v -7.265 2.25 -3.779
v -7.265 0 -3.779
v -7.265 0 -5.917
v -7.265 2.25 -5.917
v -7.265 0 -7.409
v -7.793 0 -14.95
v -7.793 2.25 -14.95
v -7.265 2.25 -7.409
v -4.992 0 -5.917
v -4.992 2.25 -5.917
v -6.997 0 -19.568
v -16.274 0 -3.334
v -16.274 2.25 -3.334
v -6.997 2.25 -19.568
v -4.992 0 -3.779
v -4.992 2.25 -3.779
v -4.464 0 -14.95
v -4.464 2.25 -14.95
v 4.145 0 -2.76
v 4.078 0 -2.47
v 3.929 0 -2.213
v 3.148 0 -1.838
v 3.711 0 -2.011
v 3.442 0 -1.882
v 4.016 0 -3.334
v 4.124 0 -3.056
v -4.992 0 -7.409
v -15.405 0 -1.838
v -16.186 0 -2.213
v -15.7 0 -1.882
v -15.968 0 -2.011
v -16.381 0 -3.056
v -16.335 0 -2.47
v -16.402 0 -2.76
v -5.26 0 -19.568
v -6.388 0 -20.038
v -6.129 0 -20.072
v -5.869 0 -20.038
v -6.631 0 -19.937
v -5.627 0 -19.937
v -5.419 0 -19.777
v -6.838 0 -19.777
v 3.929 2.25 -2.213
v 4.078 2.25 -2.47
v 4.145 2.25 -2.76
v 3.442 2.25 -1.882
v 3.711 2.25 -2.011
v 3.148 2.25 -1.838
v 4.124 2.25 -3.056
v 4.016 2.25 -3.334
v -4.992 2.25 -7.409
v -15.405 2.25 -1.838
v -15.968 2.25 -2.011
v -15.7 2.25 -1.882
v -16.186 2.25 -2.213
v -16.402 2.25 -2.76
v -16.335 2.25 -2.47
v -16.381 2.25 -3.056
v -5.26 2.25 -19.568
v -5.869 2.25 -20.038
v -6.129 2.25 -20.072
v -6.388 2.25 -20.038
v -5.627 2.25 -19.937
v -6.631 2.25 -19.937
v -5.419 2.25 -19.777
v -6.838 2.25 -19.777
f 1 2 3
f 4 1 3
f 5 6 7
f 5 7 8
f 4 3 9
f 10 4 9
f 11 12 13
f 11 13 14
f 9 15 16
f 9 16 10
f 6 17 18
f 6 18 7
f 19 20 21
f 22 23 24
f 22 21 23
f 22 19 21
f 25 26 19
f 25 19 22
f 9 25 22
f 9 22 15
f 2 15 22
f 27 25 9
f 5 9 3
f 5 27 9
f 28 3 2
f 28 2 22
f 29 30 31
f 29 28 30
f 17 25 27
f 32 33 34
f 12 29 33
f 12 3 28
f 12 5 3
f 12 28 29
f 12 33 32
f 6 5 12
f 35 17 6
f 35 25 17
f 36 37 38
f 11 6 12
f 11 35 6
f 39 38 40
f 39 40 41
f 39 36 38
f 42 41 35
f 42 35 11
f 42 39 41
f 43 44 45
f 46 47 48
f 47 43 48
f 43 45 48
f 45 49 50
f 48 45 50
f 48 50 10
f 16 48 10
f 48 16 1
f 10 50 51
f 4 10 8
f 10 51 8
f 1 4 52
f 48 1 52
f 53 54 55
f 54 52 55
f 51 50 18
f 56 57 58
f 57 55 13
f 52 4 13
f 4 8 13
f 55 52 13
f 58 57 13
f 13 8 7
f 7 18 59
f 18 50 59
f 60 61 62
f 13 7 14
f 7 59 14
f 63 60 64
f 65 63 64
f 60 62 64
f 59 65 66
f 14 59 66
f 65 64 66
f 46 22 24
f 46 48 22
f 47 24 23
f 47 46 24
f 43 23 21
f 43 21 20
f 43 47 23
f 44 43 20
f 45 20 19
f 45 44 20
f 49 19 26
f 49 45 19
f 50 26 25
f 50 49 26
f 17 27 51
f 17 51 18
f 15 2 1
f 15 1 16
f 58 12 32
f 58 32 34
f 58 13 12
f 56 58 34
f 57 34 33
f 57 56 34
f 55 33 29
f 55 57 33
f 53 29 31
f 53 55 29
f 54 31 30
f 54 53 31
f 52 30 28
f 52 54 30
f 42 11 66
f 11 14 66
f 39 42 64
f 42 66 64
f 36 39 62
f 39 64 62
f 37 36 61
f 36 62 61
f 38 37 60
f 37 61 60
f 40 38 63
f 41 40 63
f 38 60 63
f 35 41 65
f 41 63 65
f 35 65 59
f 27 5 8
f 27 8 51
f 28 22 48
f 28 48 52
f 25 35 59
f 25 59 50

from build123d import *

# Parameters (mm, degrees)
SKETCH1_W           = 2.272369049
SKETCH1_H           = 2.138700281
BOSS_EXTRUDE1_DEPTH = 2.25
FILLET1_R           = 1


with BuildPart() as part:
    # Sketch1 → Boss-Extrude1 (new body)
    with BuildSketch(Plane(origin=(0, 0, 0), x_dir=(1, 0, 0), z_dir=(0, 1, 0))):
        Polygon((-17.128579952, 1.837543865), (-6.128579952, 21.087543865), (4.871420048, 1.837543865), align=None)
        Polygon((-7.264764476, 7.408947213), (-4.992395427, 7.408947213), (-4.463947201, 14.949533453), (-7.793212702, 14.949533453), align=None, mode=Mode.SUBTRACT)
        with Locations((-6.128579952, 4.848079389)):
            Rectangle(SKETCH1_W, SKETCH1_H, mode=Mode.SUBTRACT)
    extrude(amount=BOSS_EXTRUDE1_DEPTH)

    # Fillet1
    fillet1_edges = [part.edges().sort_by_distance(p)[0] for p in [
        (-17.128579952, 1.125, -1.837543865),
        (-6.128579952, 1.125, -21.087543865),
        (4.871420048, 1.125, -1.837543865),
    ]]
    fillet(fillet1_edges, radius=FILLET1_R)


solid = part.part
